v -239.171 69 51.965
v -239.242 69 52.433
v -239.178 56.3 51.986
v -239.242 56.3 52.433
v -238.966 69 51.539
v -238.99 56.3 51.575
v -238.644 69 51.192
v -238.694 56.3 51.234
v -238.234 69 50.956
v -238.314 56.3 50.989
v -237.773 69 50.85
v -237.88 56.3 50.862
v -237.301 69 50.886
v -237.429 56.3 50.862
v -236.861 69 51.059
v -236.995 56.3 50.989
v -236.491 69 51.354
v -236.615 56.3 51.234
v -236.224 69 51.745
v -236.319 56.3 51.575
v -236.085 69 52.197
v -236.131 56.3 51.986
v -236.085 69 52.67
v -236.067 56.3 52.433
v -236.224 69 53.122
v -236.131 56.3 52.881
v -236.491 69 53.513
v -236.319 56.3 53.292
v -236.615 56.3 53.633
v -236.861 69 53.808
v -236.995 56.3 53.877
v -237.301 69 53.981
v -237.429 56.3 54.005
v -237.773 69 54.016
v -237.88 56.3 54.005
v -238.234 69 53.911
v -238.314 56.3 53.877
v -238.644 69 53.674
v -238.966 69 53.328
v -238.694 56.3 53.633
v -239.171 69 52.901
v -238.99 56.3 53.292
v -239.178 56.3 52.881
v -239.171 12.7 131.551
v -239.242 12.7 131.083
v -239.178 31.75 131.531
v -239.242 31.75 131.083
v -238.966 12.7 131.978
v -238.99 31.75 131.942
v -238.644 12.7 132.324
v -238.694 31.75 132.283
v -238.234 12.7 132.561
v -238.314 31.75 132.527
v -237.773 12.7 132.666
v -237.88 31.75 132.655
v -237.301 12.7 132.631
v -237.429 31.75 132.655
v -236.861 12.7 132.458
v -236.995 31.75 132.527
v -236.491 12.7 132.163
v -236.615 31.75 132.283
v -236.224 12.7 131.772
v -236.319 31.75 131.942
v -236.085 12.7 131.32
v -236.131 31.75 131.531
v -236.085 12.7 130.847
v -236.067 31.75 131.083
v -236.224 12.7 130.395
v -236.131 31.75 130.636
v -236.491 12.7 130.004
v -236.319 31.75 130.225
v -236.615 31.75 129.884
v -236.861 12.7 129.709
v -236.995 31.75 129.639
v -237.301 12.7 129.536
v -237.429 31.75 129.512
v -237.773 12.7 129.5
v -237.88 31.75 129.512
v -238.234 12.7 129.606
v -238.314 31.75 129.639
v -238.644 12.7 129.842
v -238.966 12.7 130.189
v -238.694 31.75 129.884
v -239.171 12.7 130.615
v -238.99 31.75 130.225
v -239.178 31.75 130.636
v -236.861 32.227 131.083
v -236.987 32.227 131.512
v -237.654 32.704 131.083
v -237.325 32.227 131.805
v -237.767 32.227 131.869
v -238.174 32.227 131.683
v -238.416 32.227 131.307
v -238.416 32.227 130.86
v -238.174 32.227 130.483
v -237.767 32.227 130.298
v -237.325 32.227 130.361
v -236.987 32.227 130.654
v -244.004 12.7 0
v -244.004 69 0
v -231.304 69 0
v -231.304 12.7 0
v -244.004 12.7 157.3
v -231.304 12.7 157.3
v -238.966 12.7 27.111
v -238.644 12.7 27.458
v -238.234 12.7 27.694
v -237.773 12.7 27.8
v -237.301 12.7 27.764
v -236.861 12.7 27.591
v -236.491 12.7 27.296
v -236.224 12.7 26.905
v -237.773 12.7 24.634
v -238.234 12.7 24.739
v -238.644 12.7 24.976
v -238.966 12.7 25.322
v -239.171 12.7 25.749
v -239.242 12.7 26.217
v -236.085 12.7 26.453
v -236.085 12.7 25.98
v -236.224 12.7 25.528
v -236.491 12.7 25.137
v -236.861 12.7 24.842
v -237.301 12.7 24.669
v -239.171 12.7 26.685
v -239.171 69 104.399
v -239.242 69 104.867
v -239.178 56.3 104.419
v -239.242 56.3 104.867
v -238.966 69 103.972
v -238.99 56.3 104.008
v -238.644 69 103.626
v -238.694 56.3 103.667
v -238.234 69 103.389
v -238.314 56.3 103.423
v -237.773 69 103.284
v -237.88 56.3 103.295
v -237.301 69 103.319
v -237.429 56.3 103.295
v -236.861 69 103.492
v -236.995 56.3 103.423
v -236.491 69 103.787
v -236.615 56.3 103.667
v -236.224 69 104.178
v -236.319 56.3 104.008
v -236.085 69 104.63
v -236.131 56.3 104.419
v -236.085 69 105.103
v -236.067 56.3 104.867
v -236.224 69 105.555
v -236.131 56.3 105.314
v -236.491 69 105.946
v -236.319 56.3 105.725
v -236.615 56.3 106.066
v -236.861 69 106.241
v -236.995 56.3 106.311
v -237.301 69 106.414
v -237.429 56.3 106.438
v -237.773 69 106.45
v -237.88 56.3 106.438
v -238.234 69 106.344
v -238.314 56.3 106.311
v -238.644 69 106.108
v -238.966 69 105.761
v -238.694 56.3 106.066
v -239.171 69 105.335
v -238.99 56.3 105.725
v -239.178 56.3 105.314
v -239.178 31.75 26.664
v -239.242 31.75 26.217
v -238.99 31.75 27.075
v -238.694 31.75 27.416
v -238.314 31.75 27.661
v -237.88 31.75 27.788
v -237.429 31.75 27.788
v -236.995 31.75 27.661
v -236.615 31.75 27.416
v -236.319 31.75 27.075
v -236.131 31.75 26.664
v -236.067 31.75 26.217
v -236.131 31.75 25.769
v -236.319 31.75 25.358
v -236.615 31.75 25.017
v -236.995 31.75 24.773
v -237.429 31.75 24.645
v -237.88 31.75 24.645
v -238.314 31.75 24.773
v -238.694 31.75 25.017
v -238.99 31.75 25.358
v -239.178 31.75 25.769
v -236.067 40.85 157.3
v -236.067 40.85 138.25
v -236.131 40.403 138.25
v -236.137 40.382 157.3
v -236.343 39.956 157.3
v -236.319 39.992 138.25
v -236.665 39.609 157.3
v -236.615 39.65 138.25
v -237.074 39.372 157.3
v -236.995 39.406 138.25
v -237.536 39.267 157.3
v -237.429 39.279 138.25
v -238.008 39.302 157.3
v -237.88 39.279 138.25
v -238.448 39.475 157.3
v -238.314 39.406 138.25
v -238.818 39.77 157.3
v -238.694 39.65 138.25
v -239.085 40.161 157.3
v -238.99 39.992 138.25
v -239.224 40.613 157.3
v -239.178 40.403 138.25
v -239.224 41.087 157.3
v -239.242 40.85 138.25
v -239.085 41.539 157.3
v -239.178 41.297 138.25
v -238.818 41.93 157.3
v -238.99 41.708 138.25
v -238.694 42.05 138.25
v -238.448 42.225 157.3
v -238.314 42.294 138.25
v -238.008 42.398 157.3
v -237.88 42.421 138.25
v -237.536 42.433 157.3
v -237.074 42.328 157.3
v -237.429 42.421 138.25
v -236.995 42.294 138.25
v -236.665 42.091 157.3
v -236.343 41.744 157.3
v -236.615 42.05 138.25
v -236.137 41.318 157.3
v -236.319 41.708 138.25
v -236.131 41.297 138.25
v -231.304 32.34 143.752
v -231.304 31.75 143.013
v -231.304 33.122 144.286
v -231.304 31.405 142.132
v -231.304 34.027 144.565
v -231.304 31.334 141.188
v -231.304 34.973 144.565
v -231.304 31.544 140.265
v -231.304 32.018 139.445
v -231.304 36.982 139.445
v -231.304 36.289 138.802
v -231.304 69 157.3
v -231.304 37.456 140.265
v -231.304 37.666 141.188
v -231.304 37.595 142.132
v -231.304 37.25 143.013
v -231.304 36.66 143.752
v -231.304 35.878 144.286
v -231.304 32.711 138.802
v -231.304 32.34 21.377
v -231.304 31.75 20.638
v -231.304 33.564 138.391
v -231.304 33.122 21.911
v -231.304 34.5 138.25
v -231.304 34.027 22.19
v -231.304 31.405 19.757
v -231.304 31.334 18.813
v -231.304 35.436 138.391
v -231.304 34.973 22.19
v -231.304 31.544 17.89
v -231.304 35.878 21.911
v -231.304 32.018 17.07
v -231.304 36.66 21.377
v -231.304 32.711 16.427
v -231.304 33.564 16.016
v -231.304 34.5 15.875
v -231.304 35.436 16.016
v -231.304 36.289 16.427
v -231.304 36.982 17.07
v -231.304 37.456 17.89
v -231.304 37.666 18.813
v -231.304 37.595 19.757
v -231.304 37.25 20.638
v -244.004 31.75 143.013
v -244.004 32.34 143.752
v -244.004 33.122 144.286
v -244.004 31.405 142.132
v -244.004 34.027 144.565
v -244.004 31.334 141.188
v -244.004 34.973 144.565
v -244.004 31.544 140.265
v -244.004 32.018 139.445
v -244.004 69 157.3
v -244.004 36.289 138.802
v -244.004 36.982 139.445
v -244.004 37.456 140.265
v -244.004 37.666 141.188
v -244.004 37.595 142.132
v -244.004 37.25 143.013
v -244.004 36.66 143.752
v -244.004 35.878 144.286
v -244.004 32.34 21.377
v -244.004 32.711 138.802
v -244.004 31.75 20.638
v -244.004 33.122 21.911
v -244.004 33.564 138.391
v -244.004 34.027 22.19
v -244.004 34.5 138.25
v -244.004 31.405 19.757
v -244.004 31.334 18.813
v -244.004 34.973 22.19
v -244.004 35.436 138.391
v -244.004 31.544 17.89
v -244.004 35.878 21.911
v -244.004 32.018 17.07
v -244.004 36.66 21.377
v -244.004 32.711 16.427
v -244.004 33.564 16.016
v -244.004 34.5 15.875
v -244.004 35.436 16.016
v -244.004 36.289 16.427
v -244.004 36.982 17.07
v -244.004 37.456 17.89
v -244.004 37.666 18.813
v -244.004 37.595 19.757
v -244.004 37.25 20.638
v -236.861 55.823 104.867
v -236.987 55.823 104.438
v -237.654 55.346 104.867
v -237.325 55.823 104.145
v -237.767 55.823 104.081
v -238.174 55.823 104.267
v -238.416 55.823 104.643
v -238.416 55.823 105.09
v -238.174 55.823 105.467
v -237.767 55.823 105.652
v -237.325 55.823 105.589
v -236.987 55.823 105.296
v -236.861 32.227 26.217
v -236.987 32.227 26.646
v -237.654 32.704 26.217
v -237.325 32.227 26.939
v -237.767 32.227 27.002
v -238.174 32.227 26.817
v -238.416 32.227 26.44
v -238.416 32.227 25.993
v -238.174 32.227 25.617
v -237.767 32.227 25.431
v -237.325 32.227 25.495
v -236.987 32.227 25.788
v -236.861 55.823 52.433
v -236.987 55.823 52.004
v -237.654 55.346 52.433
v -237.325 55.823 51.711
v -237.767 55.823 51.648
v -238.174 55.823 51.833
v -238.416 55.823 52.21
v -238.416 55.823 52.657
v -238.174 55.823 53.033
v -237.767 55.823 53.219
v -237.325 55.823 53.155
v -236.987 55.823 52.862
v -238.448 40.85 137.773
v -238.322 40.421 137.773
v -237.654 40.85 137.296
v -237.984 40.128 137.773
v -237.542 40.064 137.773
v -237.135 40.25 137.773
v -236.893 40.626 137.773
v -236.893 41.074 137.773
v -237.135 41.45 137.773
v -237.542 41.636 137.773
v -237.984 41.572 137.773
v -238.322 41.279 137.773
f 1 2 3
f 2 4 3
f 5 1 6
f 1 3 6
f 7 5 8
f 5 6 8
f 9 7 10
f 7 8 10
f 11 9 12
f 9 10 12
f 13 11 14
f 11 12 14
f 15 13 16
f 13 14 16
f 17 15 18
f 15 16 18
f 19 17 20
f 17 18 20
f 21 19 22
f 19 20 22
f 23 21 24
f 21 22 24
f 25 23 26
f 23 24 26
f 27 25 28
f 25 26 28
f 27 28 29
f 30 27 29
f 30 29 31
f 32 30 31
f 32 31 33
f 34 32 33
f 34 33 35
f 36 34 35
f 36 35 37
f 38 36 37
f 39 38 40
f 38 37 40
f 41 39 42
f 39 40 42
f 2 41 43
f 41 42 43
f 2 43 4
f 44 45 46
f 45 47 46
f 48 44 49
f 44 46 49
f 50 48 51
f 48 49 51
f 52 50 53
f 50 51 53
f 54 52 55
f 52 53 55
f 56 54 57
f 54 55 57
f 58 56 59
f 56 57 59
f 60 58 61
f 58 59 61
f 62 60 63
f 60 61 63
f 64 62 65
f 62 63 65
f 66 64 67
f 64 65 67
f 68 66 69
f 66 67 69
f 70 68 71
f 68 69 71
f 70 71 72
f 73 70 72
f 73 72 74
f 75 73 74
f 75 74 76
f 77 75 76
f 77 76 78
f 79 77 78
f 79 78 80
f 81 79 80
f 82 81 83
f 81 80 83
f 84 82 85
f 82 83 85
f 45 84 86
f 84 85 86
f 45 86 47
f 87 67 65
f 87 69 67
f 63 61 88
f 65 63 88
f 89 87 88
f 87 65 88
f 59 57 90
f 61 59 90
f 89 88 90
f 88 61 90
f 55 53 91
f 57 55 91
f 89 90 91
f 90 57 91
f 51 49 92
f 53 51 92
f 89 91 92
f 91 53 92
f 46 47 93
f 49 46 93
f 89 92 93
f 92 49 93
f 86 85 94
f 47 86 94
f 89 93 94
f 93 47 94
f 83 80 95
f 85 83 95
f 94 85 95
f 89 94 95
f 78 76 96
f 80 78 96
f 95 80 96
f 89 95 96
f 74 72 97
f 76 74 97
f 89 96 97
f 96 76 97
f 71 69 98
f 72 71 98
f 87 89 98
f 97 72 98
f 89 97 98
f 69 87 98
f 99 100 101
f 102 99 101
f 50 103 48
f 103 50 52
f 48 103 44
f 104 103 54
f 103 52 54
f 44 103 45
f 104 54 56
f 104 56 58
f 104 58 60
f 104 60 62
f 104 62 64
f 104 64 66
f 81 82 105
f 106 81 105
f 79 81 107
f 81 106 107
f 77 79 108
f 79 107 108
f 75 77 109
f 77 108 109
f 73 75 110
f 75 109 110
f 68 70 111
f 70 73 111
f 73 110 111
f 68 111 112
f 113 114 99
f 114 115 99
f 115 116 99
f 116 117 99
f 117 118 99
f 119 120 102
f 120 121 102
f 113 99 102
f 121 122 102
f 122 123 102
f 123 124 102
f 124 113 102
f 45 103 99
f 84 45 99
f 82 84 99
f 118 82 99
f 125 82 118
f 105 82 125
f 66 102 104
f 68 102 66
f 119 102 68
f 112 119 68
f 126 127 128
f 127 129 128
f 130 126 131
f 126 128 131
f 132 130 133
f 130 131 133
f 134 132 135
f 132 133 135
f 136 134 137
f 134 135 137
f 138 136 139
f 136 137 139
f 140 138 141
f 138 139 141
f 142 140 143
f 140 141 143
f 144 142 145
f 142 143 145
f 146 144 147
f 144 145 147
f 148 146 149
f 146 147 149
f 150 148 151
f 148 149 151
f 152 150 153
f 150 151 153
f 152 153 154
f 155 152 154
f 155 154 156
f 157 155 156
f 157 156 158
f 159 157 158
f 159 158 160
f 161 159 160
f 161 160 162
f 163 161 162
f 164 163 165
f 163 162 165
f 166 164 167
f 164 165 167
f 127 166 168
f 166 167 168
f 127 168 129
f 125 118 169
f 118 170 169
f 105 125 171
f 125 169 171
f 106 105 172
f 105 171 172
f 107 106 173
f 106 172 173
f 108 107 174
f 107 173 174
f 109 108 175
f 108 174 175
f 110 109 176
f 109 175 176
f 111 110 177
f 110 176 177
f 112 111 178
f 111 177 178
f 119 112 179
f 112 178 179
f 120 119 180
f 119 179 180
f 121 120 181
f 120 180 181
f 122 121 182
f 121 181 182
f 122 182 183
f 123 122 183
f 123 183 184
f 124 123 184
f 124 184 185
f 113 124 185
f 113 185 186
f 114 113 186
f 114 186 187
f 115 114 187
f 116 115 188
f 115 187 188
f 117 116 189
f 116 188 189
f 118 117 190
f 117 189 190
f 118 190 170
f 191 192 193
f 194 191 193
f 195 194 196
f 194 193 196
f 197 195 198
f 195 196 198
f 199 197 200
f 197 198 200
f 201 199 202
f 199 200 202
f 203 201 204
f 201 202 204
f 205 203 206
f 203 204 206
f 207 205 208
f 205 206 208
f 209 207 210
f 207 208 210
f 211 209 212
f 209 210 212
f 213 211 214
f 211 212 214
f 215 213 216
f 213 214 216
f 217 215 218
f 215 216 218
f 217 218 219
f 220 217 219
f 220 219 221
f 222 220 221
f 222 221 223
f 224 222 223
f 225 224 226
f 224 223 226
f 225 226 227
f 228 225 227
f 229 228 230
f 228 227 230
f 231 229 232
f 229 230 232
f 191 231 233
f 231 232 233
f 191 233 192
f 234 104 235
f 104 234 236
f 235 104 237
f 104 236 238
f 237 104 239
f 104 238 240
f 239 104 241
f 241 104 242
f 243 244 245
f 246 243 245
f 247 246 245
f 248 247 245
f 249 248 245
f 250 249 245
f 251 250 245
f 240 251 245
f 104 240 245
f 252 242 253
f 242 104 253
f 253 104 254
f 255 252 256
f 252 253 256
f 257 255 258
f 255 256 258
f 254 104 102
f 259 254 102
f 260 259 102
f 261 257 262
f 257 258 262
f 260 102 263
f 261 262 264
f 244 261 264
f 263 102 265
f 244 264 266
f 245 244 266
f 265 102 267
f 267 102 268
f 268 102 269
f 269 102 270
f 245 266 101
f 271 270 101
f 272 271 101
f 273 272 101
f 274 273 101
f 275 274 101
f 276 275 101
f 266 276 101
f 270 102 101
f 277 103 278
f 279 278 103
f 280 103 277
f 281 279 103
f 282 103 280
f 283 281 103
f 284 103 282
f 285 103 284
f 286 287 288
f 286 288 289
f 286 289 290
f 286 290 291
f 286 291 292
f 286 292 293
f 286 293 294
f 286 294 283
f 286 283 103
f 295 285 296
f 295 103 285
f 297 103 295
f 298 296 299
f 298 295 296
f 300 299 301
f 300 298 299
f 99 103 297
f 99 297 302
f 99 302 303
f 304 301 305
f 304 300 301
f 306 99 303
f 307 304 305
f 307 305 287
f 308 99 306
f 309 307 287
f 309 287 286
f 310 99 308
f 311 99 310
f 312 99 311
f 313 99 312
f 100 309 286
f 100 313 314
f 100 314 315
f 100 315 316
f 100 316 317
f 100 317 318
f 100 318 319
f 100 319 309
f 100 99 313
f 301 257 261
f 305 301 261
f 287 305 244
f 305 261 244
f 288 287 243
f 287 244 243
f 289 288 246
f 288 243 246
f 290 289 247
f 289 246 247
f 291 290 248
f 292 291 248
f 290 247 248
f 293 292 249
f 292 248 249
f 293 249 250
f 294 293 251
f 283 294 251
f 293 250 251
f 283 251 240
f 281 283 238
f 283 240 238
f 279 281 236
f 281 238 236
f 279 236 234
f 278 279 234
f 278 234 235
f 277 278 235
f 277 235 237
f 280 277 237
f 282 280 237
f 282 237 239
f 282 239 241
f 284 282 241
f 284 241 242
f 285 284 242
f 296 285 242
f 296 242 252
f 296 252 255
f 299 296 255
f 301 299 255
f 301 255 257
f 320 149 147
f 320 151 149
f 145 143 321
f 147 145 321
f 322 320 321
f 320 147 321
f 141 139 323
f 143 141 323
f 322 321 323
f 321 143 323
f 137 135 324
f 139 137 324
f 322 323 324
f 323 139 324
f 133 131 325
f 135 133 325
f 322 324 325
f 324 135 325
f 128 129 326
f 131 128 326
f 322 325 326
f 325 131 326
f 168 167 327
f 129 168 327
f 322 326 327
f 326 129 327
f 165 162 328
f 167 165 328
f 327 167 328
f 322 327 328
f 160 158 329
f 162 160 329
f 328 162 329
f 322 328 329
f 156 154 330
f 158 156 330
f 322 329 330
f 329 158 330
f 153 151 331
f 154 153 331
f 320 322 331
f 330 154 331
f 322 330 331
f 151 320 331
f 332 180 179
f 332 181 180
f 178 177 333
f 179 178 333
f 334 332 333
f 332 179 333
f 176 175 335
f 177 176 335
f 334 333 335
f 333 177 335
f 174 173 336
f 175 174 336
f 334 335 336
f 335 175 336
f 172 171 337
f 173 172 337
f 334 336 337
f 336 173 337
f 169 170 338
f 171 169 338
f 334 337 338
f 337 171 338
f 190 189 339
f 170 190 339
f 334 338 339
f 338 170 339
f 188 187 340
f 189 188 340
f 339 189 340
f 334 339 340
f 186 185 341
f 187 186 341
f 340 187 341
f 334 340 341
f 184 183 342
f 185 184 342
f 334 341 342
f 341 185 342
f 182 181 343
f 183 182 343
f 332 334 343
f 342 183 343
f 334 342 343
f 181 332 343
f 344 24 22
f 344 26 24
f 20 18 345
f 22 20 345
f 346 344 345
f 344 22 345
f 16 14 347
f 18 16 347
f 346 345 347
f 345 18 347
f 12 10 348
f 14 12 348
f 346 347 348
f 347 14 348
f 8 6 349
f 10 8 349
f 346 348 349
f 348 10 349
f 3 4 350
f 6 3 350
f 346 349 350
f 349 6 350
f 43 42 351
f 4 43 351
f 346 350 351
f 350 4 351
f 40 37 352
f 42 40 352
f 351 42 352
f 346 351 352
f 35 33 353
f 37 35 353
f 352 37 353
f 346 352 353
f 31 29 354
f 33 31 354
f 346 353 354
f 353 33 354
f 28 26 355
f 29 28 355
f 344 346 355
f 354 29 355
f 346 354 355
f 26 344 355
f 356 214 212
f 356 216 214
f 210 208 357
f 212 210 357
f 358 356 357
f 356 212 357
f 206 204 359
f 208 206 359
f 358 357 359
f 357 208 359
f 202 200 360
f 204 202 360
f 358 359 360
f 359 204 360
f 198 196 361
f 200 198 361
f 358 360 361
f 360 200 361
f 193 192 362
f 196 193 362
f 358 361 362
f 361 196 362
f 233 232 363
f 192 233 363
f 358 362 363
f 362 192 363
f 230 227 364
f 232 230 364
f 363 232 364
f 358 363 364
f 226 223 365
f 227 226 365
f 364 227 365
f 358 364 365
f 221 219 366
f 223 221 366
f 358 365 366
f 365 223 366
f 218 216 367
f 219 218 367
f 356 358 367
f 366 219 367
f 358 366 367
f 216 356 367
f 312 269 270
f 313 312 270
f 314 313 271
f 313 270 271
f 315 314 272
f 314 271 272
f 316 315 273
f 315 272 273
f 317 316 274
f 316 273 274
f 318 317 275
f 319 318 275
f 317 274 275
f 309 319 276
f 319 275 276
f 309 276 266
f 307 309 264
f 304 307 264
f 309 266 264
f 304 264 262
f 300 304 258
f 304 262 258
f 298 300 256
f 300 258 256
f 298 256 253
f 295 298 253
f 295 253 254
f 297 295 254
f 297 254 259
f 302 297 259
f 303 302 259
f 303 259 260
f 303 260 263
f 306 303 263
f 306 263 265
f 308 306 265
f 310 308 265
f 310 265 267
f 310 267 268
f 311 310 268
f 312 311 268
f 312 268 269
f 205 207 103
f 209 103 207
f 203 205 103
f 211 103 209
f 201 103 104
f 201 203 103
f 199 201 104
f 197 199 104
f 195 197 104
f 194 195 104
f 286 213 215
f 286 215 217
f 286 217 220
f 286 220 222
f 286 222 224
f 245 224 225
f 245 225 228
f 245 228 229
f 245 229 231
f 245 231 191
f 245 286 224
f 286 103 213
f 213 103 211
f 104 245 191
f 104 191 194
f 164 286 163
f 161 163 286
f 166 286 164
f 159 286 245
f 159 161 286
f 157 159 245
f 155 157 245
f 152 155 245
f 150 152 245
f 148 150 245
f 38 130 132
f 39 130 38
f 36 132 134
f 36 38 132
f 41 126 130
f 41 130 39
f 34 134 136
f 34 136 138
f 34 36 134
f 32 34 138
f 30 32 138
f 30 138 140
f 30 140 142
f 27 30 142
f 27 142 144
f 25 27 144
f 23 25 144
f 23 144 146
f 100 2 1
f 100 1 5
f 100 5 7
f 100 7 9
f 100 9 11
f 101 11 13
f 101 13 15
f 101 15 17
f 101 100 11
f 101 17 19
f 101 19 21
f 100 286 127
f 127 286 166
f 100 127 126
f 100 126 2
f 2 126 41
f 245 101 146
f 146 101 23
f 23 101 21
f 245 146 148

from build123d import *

# Parameters (mm, degrees)
SKETCH1_W                   = 12.7
SKETCH1_H                   = 56.3
BOSS_EXTRUDE1_DEPTH         = 157.3
HOLE1_D                     = 3.175
HOLE1_DEPTH                 = 31.75
HOLE1_CSINK_D               = 10.16
HOLE1_CSINK_ANGLE           = 82
HOLE1_TIP                   = 0.953866233
HOLE2_D                     = 3.175
HOLE2_DEPTH                 = 31.75
HOLE2_CSINK_D               = 10.16
HOLE2_CSINK_ANGLE           = 82
HOLE2_TIP                   = 0.953866233
HOLE_D                      = 3.175
HOLE_DEPTH                  = 31.75
HOLE_CSINK_D                = 10.16
HOLE_CSINK_ANGLE            = 82
HOLE_TIP                    = 0.953866233
HOLE3_D                     = 3.175
HOLE3_DEPTH                 = 31.75
HOLE3_CSINK_D               = 10.16
HOLE3_CSINK_ANGLE           = 82
HOLE3_TIP                   = 0.953866233
HOLE4_D                     = 3.175
HOLE4_DEPTH                 = 31.75
HOLE4_CSINK_D               = 10.16
HOLE4_CSINK_ANGLE           = 82
HOLE4_TIP                   = 0.953866233
F_1_4_0_25_DIAMETER_HOLE1_D = 6.35


with BuildPart() as part:
    # Sketch1 → Boss-Extrude1 (new body)
    with BuildSketch(Plane.XY):
        with Locations((-237.654465963, 40.85)):
            Rectangle(SKETCH1_W, SKETCH1_H)
    extrude(amount=BOSS_EXTRUDE1_DEPTH)

    # Hole1
    with Locations(Plane(origin=(-124.004465969, 0, 2.275709941), x_dir=(1, 0, 0), z_dir=(0, -1, 0))):
        with Locations((113.649999994, 128.807623392), (113.649999994, 23.940956725), (-94.599999994, 161.374290059), (94.599999994, 161.374290059), (0, 161.374290059), (0, 193.124290059), (0, 440.553783621), (0, 301.970350905), (40.979166666, 301.970350905), (166.795833328, 301.970350905), (207.774999994, 440.553783621), (207.774999994, 333.02141023), (207.774999994, 225.48903684), (207.774999994, 137.424290059), (207.774999994, 10.424290059), (-207.774999994, 10.424290059), (-207.774999994, 137.424290059), (-207.774999994, 225.48903684), (-207.774999994, 333.02141023), (-207.774999994, 440.553783621), (-166.795833328, 301.970350905), (-40.979166666, 301.970350905), (-113.649999994, 23.940956725), (-113.649999994, 128.807623392)):
            CounterSinkHole(HOLE1_D / 2, HOLE1_CSINK_D / 2, depth=HOLE1_DEPTH, counter_sink_angle=HOLE1_CSINK_ANGLE)
            with Locations((0, 0, -(HOLE1_DEPTH + HOLE1_TIP / 2))):  # 118° drill point
                Cone(0, HOLE1_D / 2, HOLE1_TIP, mode=Mode.SUBTRACT)

    # Hole2
    with Locations(Plane(origin=(-124.004465969, 0, 155.024290059), x_dir=(-1, 0, 0), z_dir=(0, -1, 0))):
        with Locations((113.649999994, 128.807623392), (113.649999994, 23.940956725), (-94.599999994, 161.374290059), (94.599999994, 161.374290059), (0, 161.374290059), (0, 193.124290059), (0, 440.553783621), (0, 301.970350905), (40.979166666, 301.970350905), (166.795833328, 301.970350905), (207.774999994, 440.553783621), (207.774999994, 333.02141023), (207.774999994, 225.48903684), (207.774999994, 137.424290059), (207.774999994, 10.424290059), (-207.774999994, 10.424290059), (-207.774999994, 137.424290059), (-207.774999994, 225.48903684), (-207.774999994, 333.02141023), (-207.774999994, 440.553783621), (-166.795833328, 301.970350905), (-40.979166666, 301.970350905), (-113.649999994, 23.940956725), (-113.649999994, 128.807623392)):
            CounterSinkHole(HOLE2_D / 2, HOLE2_CSINK_D / 2, depth=HOLE2_DEPTH, counter_sink_angle=HOLE2_CSINK_ANGLE)
            with Locations((0, 0, -(HOLE2_DEPTH + HOLE2_TIP / 2))):  # 118° drill point
                Cone(0, HOLE2_D / 2, HOLE2_TIP, mode=Mode.SUBTRACT)

    # Hole
    with Locations(Plane(origin=(-124.004465969, 277.286738577, 170), x_dir=(-1, 0, 0), z_dir=(0, 0, 1))):
        with Locations((113.649999994, 236.436738577), (207.774999994, 236.436738577)):
            CounterSinkHole(HOLE_D / 2, HOLE_CSINK_D / 2, depth=HOLE_DEPTH, counter_sink_angle=HOLE_CSINK_ANGLE)
            with Locations((0, 0, -(HOLE_DEPTH + HOLE_TIP / 2))):  # 118° drill point
                Cone(0, HOLE_D / 2, HOLE_TIP, mode=Mode.SUBTRACT)

    # Hole3
    with Locations(Plane(origin=(-124.004465969, 88.05, 155.024290059), x_dir=(1, 0, 0), z_dir=(0, 1, 0))):
        with Locations((-162.299999994, -8.625709941), (-113.649999994, 50.157623392), (-113.649999994, 102.590956725), (162.299999994, -8.625709941), (113.649999994, 50.157623392), (113.649999994, 102.590956725), (63.85, 161.374290059), (0, 161.374290059), (-63.85, 161.374290059)):
            CounterSinkHole(HOLE3_D / 2, HOLE3_CSINK_D / 2, depth=HOLE3_DEPTH, counter_sink_angle=HOLE3_CSINK_ANGLE)
            with Locations((0, 0, -(HOLE3_DEPTH + HOLE3_TIP / 2))):  # 118° drill point
                Cone(0, HOLE3_D / 2, HOLE3_TIP, mode=Mode.SUBTRACT)

    # Hole4
    with Locations(Plane(origin=(-124.004465969, 88.05, 2.275709941), x_dir=(-1, 0, 0), z_dir=(0, 1, 0))):
        with Locations((-162.299999994, -8.625709941), (-113.649999994, 50.157623392), (-113.649999994, 102.590956725), (162.299999994, -8.625709941), (113.649999994, 50.157623392), (113.649999994, 102.590956725), (63.85, 161.374290059), (0, 161.374290059), (-63.85, 161.374290059)):
            CounterSinkHole(HOLE4_D / 2, HOLE4_CSINK_D / 2, depth=HOLE4_DEPTH, counter_sink_angle=HOLE4_CSINK_ANGLE)
            with Locations((0, 0, -(HOLE4_DEPTH + HOLE4_TIP / 2))):  # 118° drill point
                Cone(0, HOLE4_D / 2, HOLE4_TIP, mode=Mode.SUBTRACT)

    # 1/4 (0.25) Diameter Hole1 (through all)
    with Locations(Plane.ZY.offset(244.004465963)):
        with Locations((141.425, 34.5), (19.05, 34.5)):
            Hole(F_1_4_0_25_DIAMETER_HOLE1_D / 2)


solid = part.part
